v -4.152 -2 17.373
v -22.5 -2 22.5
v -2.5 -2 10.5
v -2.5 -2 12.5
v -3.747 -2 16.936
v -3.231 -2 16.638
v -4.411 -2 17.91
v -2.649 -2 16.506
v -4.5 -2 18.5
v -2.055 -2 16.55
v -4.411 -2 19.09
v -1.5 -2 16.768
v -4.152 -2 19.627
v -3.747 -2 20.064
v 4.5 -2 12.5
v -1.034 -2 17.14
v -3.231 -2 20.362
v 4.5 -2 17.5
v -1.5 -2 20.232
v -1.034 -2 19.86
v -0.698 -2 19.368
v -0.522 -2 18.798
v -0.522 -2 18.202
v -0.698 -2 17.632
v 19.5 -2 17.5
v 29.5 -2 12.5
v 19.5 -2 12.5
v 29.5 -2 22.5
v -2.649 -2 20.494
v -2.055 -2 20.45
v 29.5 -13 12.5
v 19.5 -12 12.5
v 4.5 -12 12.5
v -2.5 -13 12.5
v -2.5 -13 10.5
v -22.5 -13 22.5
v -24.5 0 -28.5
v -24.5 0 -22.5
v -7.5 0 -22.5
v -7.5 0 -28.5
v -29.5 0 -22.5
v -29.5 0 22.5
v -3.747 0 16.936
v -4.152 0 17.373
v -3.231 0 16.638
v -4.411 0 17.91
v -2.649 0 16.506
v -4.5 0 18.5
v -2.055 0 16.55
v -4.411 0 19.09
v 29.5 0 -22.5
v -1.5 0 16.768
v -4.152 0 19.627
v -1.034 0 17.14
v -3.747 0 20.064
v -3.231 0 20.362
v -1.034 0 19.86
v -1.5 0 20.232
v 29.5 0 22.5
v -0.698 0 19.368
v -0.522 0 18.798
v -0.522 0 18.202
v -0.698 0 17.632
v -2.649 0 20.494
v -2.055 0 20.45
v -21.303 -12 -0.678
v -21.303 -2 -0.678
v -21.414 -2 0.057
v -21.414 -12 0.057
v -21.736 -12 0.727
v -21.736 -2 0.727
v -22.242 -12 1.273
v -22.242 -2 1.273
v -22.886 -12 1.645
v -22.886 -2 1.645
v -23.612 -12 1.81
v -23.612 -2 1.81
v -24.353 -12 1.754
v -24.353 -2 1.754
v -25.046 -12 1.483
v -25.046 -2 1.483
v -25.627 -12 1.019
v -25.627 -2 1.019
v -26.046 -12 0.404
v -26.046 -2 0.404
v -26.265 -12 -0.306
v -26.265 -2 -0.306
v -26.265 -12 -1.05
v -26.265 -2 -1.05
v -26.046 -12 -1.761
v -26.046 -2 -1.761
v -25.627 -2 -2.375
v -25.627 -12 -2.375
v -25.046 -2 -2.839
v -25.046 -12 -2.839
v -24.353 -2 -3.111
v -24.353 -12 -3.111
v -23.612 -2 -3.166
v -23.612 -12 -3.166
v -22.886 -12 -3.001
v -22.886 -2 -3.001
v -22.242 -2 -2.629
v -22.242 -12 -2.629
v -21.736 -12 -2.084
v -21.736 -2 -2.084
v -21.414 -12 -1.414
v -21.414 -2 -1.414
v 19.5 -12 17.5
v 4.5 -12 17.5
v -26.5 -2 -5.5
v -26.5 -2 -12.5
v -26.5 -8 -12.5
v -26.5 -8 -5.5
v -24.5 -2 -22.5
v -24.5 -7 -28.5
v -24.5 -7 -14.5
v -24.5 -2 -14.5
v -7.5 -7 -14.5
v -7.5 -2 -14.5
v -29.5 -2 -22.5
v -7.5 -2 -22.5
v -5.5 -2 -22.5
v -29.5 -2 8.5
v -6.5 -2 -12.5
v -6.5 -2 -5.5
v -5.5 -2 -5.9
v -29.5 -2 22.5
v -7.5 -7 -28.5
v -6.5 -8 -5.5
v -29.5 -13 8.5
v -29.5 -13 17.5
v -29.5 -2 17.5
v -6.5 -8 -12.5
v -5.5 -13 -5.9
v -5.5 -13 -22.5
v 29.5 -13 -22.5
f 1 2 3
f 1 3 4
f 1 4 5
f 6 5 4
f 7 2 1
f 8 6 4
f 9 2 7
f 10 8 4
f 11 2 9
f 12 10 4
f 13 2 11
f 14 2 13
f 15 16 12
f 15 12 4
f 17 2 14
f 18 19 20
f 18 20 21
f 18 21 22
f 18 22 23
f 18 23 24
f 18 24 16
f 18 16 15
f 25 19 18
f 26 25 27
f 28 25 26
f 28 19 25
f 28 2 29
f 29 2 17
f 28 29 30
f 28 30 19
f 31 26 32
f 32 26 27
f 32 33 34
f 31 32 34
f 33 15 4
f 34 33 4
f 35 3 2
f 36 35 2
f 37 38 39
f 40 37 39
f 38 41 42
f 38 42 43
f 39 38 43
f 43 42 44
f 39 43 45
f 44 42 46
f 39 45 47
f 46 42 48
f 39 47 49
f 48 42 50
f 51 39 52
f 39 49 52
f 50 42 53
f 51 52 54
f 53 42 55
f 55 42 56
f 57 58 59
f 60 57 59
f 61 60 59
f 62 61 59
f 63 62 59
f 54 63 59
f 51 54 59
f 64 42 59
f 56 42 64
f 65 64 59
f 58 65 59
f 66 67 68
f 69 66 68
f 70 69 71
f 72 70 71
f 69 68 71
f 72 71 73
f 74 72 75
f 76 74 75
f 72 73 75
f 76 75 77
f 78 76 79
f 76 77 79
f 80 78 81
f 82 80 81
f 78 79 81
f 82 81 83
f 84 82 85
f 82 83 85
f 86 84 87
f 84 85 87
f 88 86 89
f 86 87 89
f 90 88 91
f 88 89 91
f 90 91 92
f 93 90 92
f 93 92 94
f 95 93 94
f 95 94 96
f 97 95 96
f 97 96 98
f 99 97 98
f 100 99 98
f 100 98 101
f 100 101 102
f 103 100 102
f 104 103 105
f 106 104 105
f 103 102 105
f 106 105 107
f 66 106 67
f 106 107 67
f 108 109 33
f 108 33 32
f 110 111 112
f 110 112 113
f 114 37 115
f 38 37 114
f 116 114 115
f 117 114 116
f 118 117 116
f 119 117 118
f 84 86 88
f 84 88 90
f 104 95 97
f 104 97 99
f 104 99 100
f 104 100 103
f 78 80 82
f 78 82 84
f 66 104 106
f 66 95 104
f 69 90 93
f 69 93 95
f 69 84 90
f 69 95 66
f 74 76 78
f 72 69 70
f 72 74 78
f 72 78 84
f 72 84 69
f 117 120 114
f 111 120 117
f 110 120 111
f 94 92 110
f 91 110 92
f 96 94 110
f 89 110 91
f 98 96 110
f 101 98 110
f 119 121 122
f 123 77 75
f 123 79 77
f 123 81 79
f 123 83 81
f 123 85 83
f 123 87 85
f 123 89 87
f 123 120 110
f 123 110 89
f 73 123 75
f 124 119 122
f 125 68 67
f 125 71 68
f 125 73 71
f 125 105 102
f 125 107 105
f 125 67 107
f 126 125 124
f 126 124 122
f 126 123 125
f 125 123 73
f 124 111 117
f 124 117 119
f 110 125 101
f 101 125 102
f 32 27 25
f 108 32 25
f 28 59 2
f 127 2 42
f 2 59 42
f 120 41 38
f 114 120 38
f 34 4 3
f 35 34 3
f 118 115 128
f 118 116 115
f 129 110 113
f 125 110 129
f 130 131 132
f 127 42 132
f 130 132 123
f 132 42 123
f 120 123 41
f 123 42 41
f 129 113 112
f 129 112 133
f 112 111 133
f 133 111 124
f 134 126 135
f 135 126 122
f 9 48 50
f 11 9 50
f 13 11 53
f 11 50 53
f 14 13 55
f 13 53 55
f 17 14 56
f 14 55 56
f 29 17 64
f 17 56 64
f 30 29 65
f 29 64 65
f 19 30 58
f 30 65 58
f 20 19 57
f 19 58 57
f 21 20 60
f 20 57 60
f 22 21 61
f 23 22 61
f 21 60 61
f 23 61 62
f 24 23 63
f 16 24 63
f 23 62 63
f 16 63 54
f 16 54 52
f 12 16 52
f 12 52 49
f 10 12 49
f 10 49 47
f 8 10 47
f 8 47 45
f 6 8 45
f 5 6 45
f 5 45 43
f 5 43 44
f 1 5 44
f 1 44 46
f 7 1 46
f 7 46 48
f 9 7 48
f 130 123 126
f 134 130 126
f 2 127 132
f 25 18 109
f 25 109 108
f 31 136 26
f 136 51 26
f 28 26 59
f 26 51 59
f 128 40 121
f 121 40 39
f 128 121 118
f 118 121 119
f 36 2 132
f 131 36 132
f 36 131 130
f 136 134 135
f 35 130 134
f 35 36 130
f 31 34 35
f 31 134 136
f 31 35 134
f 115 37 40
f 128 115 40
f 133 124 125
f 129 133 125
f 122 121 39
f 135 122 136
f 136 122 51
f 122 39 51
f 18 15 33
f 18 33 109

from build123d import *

# Parameters (mm, degrees)
F0_W     = 17
F0_H     = 6
F1_DEPTH = 2
F3_DEPTH = 11
F2_W     = 15
F2_H     = 5
F4_DEPTH = 10
F5_D     = 4
F5_DEPTH = 6
F2_W_2   = 20
F2_H_2   = 7
F6_DEPTH = 6
F2_R     = 2.495167
F7_DEPTH = 10
F0_H_2   = 8
F8_DEPTH = 7


with BuildPart() as f1:
    # F0 (on Front) → F1 (new body)
    with BuildSketch(Plane.XZ):
        Polygon((29.5, 22.5), (-29.5, 22.5), (-29.5, -22.5), (-24.5, -22.5), (-24.5, -14.5), (-7.5, -14.5), (-7.5, -22.5), (29.5, -22.5), align=None)
        with Locations((-16, -25.5)):
            Rectangle(F0_W, F0_H)
    extrude(amount=F1_DEPTH)

    # F2 (on face) → F3 (join)
    with BuildSketch(Plane.XZ.offset(2)):
        Polygon((-2.5, 2.5), (-5.5, 2.5), (-5.5, -5.9), (-5.5, -22.5), (29.5, -22.5), (29.5, 2.5), align=None)
        Polygon((-5.5, -5.9), (-5.5, 2.5), (-2.5, 2.5), (-2.5, 10.5), (-5.5, 12.3), (-22.5, 22.5), (-29.5, 17.5), (-29.5, 8.5), align=None)
        Polygon((-2.5, 10.5), (-2.5, 2.5), (29.5, 2.5), (29.5, 12.5), (19.5, 12.5), (4.5, 12.5), (-2.5, 12.5), align=None)
    extrude(amount=F3_DEPTH)

    # F2 (on face) → F4 (join)
    with BuildSketch(Plane.XZ.offset(2)):
        with Locations((12, 15)):
            Rectangle(F2_W, F2_H)
    extrude(amount=F4_DEPTH)

    # F5
    with Locations(Plane.XZ.offset(2)):
        with Locations((-2.5, 18.5)):
            Hole(F5_D / 2, depth=F5_DEPTH)

    # F2 (on face) → F6 (join)
    with BuildSketch(Plane.XZ.offset(2)):
        with Locations((-16.5, -9)):
            Rectangle(F2_W_2, F2_H_2)
    extrude(amount=F6_DEPTH)

    # F2 (on face) → F7 (join)
    with BuildSketch(Plane.XZ.offset(2)):
        with Locations((-23.798013, -0.678133)):
            Circle(F2_R)
    extrude(amount=F7_DEPTH)

    # F0 (on Front) → F8 (join)
    with BuildSketch(Plane.XZ):
        with Locations((-16, -25.5)):
            Rectangle(F0_W, F0_H)
        with Locations((-16, -18.5)):
            Rectangle(F0_W, F0_H_2)
    extrude(amount=F8_DEPTH)


solid = f1.part
